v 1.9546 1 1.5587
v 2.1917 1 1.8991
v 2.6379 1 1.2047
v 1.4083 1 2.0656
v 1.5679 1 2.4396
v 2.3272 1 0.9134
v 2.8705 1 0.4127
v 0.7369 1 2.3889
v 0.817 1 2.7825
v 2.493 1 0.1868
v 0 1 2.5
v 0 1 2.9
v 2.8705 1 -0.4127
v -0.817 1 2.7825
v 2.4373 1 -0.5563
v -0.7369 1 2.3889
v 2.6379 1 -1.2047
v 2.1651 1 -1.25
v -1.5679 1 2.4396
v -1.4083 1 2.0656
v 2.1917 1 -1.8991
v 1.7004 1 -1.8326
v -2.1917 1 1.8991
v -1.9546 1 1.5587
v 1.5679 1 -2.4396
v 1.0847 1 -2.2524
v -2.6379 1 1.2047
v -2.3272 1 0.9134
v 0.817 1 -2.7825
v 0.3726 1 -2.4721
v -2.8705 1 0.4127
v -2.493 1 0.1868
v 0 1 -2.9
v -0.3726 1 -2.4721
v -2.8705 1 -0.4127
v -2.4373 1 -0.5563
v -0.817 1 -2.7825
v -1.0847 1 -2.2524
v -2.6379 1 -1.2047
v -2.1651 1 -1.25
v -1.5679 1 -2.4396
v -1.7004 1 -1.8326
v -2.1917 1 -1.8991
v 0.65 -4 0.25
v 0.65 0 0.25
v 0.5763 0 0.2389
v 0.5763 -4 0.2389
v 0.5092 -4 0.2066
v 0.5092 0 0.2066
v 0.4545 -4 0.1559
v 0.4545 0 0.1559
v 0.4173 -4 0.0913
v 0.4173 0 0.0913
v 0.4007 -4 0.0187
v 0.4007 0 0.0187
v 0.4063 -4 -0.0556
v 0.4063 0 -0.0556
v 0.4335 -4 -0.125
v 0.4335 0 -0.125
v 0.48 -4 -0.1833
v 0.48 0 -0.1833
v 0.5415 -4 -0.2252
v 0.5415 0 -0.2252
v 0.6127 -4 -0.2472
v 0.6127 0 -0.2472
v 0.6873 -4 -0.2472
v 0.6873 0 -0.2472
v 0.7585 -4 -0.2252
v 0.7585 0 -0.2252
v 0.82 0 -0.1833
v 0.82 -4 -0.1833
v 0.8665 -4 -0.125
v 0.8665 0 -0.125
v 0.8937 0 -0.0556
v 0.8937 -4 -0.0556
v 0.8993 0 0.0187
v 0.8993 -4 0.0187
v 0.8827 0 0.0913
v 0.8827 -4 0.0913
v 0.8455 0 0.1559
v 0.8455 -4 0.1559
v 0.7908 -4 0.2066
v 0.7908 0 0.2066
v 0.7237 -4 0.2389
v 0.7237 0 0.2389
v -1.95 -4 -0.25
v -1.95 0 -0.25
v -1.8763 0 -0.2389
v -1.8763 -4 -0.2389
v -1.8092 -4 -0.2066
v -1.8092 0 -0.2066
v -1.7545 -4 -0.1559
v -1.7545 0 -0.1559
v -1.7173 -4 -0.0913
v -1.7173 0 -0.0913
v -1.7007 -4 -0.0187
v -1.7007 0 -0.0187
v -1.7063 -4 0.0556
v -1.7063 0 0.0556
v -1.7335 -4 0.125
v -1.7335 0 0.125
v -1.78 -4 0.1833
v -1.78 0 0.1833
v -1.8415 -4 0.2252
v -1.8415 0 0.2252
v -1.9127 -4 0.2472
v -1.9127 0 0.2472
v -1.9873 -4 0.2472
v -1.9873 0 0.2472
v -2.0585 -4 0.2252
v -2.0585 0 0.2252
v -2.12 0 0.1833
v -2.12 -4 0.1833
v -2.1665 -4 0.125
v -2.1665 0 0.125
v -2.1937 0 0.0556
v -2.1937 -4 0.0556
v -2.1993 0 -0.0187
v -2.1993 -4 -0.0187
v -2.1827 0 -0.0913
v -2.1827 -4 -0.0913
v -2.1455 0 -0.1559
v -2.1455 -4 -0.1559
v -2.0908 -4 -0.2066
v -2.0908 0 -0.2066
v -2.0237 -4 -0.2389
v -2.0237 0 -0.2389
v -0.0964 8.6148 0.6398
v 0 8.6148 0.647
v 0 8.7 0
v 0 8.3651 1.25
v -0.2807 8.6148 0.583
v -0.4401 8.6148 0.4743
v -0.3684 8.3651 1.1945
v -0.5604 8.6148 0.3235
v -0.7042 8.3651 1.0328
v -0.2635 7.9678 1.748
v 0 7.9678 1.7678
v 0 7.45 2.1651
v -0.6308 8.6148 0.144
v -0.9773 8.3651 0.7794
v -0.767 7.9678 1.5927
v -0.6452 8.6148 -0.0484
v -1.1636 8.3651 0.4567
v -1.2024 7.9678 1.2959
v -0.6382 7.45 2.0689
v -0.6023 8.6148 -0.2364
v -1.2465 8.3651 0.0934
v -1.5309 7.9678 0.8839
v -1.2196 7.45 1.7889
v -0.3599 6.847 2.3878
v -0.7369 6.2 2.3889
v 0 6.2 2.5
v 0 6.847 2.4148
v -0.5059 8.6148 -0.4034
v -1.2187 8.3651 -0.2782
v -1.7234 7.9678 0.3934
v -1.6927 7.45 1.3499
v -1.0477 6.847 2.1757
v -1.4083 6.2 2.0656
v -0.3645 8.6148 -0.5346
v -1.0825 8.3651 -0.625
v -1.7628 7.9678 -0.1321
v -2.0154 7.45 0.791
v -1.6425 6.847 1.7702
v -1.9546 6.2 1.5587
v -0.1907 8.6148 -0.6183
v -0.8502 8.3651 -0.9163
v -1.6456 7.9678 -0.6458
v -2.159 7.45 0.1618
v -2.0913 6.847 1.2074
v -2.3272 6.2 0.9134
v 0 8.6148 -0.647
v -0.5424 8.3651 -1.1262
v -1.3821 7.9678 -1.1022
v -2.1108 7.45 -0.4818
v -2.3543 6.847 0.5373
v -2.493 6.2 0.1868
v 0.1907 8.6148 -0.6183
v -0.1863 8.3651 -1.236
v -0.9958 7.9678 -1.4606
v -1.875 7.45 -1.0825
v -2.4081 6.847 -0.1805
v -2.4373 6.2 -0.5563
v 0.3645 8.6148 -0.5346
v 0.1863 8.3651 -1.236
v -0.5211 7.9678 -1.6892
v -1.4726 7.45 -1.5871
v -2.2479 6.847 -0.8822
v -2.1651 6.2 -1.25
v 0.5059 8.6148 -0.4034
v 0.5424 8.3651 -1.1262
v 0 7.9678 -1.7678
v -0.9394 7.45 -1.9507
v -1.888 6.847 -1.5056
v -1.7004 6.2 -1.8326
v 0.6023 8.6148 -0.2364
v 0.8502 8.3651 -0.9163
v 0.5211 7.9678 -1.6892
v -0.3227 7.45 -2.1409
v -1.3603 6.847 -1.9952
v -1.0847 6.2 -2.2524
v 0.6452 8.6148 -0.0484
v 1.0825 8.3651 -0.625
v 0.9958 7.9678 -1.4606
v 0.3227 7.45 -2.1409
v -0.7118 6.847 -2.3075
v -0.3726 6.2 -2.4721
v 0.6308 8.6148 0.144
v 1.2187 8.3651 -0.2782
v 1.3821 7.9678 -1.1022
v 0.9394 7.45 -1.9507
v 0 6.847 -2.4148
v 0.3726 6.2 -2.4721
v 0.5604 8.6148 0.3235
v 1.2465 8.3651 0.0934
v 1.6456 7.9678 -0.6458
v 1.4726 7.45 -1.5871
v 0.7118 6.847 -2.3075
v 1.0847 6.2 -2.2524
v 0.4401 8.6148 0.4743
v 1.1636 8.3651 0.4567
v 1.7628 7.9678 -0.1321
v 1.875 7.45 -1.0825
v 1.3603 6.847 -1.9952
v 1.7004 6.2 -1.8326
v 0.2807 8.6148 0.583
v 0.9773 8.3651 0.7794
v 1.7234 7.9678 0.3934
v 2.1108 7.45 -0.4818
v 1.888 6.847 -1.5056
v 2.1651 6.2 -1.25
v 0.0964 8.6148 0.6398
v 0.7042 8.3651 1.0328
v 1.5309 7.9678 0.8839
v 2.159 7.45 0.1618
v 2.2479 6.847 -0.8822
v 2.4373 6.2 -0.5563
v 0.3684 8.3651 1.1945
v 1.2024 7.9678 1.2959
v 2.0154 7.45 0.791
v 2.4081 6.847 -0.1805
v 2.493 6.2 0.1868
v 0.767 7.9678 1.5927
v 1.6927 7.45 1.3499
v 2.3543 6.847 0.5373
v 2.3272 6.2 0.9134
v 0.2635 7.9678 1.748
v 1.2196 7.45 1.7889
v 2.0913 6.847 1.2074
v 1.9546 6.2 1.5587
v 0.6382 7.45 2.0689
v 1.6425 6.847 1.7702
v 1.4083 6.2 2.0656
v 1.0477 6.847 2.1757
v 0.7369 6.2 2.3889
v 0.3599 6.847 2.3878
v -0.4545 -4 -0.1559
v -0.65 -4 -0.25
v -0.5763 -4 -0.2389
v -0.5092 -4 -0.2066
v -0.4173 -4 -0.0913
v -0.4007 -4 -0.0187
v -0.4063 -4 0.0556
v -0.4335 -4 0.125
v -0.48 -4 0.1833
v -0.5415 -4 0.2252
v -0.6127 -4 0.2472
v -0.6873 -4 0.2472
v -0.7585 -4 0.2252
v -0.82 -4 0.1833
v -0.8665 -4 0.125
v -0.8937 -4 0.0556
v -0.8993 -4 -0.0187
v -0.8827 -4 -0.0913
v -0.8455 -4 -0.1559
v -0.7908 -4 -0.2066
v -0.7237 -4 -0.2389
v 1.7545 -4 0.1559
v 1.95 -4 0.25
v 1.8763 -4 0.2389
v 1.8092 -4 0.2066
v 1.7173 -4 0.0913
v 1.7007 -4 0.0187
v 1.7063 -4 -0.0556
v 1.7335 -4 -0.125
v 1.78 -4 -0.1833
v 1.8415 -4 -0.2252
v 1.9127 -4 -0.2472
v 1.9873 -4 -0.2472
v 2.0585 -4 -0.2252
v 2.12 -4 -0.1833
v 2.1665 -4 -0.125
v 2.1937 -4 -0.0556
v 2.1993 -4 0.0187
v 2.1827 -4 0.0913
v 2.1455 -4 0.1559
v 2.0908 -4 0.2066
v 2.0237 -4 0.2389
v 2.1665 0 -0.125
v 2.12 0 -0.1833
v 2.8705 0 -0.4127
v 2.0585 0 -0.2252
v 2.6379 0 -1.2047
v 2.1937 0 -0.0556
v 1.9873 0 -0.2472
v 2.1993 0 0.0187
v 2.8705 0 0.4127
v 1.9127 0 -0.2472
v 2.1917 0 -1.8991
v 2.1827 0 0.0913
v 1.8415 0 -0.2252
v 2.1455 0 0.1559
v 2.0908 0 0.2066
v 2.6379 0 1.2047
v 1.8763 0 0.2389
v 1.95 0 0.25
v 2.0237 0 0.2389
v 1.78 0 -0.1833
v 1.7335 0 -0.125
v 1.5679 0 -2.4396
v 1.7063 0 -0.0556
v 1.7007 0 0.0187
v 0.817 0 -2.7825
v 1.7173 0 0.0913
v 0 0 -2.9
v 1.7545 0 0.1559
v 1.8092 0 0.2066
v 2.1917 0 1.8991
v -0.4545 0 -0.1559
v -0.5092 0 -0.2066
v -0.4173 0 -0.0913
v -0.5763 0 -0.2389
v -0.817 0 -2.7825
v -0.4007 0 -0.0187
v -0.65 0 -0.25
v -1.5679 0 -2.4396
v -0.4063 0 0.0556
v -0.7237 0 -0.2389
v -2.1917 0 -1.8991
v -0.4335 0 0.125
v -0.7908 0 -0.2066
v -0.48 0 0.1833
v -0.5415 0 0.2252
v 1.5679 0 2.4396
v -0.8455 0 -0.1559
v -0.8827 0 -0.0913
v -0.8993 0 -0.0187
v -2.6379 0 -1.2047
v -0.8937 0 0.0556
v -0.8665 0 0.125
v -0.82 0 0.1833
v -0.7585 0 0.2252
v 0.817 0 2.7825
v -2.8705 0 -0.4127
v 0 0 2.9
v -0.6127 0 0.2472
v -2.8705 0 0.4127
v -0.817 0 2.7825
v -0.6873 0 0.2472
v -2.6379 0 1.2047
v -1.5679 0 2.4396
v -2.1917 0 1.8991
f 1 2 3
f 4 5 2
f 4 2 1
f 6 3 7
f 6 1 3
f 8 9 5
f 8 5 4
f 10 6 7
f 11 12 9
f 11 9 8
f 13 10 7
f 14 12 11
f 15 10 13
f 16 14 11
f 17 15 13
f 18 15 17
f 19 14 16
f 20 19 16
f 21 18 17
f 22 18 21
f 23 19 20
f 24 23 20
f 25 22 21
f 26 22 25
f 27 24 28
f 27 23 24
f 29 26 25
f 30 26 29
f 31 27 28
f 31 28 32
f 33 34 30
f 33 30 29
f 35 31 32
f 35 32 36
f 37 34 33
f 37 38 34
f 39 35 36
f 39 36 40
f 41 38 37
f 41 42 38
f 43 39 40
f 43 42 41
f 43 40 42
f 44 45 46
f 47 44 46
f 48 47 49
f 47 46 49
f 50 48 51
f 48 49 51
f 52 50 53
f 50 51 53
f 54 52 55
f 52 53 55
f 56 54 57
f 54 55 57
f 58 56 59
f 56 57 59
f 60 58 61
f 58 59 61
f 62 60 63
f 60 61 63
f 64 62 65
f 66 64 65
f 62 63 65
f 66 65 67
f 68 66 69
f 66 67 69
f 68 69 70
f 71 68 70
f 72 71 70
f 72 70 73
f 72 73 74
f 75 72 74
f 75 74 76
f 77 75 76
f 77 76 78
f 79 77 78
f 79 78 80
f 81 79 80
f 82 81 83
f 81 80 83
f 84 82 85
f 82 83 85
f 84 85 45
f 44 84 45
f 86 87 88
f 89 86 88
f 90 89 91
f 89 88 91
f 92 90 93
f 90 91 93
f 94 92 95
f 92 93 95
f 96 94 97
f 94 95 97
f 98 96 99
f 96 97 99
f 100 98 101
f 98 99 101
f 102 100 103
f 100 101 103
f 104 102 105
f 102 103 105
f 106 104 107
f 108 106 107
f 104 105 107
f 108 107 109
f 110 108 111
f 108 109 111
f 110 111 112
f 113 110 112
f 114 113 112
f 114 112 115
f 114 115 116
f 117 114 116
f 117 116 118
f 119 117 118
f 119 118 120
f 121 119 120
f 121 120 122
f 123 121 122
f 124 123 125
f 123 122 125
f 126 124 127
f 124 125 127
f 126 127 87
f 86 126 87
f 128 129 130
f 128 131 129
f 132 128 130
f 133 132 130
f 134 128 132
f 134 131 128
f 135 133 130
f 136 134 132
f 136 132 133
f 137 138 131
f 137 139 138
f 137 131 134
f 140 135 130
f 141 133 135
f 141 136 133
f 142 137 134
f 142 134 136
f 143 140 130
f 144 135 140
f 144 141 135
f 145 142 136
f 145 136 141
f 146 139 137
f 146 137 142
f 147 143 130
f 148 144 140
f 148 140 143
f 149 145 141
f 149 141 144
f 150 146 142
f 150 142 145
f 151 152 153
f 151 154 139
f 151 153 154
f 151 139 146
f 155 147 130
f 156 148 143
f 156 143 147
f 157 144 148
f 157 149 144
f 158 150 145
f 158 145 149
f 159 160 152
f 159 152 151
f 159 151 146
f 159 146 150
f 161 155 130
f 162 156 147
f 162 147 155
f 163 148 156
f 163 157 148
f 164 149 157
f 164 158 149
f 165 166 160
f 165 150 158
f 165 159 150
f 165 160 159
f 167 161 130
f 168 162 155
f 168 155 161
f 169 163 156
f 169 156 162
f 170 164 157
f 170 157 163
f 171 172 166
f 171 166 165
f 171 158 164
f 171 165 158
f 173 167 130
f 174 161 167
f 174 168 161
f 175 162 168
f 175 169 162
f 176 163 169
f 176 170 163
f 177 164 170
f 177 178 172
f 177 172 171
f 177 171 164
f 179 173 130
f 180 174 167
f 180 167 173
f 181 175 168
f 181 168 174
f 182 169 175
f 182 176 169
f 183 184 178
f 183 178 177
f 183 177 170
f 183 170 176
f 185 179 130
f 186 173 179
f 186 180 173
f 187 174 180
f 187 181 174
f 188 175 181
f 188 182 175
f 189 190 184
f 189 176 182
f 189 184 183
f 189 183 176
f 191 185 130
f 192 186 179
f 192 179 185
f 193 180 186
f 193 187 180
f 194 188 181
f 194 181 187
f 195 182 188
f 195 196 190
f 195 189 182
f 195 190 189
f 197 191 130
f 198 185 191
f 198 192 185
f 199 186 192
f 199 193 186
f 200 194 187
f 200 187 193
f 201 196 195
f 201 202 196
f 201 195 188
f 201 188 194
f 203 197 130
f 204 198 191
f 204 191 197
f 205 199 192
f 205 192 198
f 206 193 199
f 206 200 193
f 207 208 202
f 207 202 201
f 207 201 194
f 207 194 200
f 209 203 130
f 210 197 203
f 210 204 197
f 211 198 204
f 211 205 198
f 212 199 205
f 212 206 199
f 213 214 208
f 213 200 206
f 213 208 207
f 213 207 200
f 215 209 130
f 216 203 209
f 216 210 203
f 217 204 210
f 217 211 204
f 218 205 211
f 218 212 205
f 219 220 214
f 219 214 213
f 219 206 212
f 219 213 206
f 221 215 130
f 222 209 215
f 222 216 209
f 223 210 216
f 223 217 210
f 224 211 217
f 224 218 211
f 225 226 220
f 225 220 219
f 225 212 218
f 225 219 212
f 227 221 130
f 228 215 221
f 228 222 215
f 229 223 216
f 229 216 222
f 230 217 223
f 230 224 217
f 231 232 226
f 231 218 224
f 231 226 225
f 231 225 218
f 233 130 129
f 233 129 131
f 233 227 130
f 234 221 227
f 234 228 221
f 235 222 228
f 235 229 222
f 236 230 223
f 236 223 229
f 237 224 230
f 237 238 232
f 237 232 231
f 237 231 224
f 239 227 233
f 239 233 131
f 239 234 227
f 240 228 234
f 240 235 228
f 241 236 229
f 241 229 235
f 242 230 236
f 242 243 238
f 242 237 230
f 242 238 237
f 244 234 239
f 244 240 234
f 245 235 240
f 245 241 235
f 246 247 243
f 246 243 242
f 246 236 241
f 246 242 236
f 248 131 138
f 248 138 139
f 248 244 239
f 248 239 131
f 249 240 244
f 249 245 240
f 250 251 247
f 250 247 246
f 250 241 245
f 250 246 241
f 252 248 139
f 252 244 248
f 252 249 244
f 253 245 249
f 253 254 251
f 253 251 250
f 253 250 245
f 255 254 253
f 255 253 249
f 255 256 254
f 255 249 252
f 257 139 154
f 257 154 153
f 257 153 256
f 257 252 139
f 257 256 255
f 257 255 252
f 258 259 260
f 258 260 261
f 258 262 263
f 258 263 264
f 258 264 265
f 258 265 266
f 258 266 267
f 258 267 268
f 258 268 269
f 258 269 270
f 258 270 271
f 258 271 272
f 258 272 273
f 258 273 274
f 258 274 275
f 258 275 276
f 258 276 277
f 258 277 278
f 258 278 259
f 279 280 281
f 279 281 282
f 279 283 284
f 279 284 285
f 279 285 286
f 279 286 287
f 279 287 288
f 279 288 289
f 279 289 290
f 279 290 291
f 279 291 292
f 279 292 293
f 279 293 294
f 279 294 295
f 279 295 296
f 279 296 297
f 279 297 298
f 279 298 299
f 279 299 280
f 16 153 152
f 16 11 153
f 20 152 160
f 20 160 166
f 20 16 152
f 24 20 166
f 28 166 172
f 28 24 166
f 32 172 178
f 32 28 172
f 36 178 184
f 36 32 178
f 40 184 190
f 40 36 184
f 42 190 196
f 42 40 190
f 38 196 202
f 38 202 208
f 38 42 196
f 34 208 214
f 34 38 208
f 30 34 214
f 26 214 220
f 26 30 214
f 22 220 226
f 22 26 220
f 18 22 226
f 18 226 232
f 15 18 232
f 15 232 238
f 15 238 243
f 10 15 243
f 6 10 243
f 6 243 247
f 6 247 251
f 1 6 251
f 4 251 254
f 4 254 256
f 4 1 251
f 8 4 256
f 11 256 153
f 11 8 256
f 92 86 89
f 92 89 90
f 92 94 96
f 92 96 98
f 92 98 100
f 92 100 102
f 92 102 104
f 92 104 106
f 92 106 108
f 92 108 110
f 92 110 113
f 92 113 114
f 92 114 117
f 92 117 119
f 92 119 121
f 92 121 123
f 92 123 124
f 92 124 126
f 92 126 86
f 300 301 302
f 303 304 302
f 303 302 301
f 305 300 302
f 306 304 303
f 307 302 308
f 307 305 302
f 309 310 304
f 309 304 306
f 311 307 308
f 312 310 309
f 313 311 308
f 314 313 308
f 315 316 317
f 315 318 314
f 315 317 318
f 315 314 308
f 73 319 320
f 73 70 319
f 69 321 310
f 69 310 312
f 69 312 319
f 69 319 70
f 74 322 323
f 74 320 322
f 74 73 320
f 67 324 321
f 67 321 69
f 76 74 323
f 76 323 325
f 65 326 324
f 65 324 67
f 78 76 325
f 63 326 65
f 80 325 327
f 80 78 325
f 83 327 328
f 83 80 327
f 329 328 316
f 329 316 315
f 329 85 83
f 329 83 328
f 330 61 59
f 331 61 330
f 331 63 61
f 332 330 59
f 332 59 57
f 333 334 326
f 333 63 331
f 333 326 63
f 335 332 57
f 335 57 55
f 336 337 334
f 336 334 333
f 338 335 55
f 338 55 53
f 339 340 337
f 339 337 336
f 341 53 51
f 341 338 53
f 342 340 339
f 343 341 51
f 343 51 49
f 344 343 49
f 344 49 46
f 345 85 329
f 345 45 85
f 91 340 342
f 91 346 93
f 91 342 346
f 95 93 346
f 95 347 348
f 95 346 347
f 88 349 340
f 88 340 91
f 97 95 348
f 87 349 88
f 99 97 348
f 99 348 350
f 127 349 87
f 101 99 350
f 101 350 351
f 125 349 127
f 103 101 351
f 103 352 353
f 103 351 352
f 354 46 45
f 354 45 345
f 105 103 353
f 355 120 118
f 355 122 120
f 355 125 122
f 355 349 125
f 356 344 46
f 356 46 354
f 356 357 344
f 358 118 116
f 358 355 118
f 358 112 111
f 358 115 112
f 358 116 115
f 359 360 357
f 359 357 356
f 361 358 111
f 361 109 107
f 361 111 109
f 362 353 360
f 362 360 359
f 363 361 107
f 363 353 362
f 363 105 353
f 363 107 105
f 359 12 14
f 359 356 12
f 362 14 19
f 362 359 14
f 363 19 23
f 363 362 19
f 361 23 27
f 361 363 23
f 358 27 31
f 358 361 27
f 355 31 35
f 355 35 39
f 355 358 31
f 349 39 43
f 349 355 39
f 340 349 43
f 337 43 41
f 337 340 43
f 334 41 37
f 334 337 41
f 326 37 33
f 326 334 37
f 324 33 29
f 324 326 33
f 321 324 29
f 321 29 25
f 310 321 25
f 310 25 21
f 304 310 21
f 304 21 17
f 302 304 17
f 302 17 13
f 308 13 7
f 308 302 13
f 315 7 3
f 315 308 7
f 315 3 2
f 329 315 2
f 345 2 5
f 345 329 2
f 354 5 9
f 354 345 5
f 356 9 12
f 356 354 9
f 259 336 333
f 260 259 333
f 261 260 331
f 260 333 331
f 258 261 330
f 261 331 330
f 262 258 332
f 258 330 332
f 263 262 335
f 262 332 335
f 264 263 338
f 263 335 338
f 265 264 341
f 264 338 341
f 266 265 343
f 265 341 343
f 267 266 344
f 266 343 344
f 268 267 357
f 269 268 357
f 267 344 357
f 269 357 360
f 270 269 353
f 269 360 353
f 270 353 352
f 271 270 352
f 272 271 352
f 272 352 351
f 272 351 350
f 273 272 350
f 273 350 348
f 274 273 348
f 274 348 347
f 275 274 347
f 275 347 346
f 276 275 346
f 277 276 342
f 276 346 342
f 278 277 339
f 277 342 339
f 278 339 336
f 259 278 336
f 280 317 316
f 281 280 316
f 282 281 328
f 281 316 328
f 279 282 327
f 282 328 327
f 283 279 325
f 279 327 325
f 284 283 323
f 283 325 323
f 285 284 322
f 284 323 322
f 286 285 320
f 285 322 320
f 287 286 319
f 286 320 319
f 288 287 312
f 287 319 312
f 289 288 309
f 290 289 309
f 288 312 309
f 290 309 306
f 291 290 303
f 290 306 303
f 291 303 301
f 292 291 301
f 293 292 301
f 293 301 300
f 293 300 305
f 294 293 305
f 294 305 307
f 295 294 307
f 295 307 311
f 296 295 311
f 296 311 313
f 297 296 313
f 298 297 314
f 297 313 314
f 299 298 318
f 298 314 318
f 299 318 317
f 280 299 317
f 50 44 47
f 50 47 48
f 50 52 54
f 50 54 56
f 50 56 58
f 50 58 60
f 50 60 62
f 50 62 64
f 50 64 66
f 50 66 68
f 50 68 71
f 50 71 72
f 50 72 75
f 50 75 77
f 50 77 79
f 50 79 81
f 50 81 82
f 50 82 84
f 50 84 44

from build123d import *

# Parameters (mm, degrees)
SKETCH2_R           = 0.25
BOSS_EXTRUDE1_DEPTH = 4


with BuildPart() as part:
    # Sketch1 → Revolve1 (revolve)
    with BuildSketch(Plane(origin=(0, 0, 0), x_dir=(0, 0, -1), z_dir=(1, 0, 0))):
        with BuildLine():
            Line((-2.5, 6.2), (-2.5, 1))
            Line((-2.5, 1), (-2.9, 1))
            Line((-2.9, 1), (-2.9, 0))
            Line((-2.9, 0), (0, 0))
            Line((0, 0), (0, 8.7))
            ThreePointArc((0, 8.7), (-1.767766953, 7.967766953), (-2.5, 6.2))
        make_face()
    revolve(axis=Axis((0, 16.477597325, 0), (0, -1, 0)))

    # Sketch2 → Boss-Extrude1 (add)
    with BuildSketch(Plane.XZ):
        with Locations(Location((-1.95, 0, 0), (0, 0, 270))):
            Circle(SKETCH2_R)
        with Locations(Location((-0.65, 0, 0), (0, 0, 270))):
            Circle(SKETCH2_R)
        with Locations(Location((0.65, 0, 0), (0, 0, 90))):
            Circle(SKETCH2_R)
        with Locations(Location((1.95, 0, 0), (0, 0, 90))):
            Circle(SKETCH2_R)
    extrude(amount=BOSS_EXTRUDE1_DEPTH)


solid = part.part
